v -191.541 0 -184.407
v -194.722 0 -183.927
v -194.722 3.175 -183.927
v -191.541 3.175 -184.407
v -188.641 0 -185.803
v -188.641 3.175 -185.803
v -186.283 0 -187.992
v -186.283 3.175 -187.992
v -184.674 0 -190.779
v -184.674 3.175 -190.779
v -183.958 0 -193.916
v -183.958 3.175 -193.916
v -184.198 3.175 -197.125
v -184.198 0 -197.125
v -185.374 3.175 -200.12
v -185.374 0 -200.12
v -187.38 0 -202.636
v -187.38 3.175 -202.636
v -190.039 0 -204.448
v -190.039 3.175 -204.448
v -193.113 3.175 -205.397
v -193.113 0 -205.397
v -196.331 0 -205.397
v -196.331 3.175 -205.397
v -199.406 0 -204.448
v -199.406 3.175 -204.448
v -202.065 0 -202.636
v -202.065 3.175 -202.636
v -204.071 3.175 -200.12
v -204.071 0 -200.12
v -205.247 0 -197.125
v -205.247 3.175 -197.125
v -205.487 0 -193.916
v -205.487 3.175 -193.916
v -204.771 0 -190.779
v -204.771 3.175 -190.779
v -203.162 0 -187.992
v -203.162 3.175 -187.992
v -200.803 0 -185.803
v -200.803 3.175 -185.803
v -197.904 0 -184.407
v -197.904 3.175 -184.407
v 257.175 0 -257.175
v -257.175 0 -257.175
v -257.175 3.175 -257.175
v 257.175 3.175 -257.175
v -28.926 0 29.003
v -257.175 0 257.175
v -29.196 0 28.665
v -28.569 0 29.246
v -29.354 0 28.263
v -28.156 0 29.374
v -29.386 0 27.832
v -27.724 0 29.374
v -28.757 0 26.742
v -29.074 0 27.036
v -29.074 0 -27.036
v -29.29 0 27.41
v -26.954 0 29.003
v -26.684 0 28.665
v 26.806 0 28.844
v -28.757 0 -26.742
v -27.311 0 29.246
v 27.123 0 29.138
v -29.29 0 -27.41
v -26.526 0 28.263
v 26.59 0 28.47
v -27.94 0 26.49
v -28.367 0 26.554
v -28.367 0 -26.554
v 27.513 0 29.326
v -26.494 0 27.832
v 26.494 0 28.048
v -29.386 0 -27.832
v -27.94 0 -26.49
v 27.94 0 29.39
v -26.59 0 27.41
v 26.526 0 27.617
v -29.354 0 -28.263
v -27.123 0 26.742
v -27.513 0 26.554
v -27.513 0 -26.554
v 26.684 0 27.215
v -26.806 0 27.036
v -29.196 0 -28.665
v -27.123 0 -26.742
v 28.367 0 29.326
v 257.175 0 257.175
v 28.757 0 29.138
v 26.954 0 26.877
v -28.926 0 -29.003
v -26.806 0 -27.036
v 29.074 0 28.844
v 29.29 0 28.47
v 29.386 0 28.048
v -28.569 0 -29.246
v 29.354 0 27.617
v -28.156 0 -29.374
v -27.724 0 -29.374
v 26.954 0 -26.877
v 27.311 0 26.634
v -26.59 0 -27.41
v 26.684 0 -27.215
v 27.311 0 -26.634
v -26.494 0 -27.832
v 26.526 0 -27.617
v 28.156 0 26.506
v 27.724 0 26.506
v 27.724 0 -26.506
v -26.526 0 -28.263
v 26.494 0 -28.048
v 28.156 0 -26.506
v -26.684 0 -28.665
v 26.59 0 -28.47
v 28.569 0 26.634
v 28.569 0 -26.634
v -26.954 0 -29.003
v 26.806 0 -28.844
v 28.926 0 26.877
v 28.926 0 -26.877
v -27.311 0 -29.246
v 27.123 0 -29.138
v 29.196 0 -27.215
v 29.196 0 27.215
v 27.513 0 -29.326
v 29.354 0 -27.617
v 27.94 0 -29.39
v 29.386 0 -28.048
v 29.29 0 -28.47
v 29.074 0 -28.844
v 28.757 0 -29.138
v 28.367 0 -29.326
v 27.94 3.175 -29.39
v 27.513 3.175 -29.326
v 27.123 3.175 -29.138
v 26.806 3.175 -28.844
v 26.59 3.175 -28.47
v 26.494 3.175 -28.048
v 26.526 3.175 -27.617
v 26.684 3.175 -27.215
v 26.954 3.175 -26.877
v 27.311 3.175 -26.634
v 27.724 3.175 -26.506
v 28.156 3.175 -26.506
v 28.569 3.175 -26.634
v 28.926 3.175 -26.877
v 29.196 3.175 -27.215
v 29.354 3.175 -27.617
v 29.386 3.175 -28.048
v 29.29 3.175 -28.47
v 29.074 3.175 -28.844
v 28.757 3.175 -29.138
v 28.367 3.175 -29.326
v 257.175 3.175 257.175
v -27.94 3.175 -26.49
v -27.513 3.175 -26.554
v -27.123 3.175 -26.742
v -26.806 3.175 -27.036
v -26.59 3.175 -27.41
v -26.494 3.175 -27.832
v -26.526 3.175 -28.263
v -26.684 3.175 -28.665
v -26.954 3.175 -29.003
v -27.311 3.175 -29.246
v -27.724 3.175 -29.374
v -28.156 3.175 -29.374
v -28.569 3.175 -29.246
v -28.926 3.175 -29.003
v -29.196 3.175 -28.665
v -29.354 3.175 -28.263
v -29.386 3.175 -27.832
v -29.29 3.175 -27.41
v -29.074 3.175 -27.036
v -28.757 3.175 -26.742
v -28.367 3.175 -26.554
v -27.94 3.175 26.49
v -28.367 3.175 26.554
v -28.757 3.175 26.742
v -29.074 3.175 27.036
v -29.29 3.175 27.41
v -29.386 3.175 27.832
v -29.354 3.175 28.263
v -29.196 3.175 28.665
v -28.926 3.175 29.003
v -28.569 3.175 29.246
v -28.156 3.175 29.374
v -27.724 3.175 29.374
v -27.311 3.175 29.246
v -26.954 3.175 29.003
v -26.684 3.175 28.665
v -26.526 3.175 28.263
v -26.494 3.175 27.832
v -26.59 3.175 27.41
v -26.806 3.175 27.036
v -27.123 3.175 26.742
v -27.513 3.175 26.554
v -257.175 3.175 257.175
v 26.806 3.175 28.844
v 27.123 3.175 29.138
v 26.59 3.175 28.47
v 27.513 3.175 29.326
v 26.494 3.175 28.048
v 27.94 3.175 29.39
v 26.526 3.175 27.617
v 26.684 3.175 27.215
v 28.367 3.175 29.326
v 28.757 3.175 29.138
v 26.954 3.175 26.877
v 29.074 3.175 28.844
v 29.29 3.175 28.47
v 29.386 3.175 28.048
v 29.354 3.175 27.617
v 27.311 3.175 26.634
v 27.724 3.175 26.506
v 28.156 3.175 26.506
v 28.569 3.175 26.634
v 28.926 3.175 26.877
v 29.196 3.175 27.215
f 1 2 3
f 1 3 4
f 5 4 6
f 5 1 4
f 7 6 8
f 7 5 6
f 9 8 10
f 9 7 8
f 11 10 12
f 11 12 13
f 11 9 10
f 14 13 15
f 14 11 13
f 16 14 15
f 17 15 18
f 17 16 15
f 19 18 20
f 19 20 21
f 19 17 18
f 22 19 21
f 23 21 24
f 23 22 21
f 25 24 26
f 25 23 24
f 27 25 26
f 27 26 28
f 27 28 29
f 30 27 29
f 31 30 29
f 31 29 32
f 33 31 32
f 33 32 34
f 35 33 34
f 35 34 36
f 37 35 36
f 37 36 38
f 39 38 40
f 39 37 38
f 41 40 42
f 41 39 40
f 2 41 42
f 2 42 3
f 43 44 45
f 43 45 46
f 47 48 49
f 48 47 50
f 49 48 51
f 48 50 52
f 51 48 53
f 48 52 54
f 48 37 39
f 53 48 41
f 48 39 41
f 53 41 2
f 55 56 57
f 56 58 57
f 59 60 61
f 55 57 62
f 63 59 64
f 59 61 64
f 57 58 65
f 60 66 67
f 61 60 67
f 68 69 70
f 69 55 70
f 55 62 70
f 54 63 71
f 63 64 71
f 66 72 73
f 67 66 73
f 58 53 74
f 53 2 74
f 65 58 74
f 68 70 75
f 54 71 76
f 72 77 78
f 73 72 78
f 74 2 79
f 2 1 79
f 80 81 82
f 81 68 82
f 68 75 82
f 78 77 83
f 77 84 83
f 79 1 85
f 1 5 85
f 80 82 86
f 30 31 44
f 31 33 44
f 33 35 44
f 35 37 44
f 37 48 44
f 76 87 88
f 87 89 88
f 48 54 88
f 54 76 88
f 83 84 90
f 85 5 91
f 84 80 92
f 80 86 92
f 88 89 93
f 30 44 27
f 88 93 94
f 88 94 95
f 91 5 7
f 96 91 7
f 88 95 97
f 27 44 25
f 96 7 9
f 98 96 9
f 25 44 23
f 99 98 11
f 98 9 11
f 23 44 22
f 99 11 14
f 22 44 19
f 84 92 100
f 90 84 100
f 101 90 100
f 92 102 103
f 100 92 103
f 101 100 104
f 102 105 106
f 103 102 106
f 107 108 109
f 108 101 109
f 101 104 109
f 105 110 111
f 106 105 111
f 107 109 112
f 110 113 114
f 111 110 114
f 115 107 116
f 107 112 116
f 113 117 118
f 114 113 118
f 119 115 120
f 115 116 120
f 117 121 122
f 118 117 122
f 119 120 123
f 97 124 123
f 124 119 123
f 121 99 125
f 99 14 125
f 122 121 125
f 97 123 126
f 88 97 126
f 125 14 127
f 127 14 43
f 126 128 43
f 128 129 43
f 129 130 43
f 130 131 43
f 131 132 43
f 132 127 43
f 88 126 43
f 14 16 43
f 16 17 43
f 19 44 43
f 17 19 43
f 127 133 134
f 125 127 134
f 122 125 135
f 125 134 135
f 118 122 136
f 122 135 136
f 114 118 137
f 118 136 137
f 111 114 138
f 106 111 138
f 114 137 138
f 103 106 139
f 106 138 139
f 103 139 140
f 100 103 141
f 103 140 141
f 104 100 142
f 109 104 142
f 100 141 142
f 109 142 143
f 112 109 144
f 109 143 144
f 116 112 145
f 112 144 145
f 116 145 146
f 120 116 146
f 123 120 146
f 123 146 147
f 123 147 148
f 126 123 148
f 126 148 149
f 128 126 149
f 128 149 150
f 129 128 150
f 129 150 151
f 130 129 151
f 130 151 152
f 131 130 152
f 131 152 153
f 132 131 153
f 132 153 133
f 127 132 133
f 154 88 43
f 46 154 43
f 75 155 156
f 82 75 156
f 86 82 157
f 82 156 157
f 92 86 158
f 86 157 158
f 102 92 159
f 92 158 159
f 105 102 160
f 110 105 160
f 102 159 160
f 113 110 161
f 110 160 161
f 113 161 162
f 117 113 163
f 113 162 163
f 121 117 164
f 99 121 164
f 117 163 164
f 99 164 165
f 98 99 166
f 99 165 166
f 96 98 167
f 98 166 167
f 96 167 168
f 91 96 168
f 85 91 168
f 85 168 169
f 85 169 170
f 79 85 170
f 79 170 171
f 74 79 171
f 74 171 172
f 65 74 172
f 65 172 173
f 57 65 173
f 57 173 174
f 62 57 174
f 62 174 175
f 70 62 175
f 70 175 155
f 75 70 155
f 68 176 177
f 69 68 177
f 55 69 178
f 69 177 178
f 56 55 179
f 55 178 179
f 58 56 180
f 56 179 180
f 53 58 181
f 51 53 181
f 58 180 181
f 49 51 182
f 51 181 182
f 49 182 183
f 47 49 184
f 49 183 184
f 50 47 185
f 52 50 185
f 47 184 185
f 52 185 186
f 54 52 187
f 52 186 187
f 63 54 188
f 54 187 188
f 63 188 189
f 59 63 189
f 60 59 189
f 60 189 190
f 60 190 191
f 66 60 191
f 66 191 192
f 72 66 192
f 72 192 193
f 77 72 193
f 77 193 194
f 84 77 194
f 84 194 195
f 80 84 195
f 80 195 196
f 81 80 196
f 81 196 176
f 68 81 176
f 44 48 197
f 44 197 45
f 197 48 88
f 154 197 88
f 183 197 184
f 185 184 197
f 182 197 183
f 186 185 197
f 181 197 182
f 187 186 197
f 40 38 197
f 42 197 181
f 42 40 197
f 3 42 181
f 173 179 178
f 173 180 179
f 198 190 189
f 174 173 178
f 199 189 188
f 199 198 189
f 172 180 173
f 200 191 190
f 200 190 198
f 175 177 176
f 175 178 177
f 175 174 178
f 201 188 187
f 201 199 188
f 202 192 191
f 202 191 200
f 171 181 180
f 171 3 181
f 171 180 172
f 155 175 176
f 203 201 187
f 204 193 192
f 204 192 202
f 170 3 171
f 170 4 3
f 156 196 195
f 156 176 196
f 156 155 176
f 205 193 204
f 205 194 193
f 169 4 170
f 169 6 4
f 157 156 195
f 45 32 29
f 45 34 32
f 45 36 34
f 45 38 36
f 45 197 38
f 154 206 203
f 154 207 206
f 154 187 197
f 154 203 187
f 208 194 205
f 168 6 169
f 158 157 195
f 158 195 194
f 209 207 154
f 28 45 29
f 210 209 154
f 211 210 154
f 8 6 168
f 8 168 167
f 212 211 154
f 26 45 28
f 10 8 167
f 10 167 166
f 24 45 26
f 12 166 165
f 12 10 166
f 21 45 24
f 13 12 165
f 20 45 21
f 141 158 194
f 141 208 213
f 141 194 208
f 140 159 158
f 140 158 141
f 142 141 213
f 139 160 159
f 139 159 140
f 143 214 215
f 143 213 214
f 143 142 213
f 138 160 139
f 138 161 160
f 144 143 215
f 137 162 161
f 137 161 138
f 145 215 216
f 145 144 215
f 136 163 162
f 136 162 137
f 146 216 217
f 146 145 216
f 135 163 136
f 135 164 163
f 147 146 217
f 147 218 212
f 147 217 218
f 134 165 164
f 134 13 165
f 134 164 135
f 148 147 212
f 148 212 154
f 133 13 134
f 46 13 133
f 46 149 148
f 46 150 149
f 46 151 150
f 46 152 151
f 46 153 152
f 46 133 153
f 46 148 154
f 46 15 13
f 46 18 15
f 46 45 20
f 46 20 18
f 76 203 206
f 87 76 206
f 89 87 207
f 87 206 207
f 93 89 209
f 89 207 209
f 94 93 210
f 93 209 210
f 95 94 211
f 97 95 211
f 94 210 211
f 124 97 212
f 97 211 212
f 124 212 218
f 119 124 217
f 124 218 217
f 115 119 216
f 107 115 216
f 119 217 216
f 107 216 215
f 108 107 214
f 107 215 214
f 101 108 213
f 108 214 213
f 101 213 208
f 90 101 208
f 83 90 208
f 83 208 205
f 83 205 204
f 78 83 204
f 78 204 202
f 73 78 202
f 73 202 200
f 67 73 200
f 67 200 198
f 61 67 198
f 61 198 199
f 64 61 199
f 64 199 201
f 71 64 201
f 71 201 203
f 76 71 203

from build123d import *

# Parameters (mm, degrees)
SKETCH1_W           = 514.35
SKETCH1_H           = 514.35
SKETCH1_R           = 10.795
BOSS_EXTRUDE1_DEPTH = 3.175
SKETCH2_R           = 1.45
CUT_EXTRUDE1_DEPTH  = 364.714231059


with BuildPart() as part:
    # Sketch1 → Boss-Extrude1 (new body)
    with BuildSketch(Plane(origin=(0, 0, 0), x_dir=(1, 0, 0), z_dir=(0, 1, 0))):
        Rectangle(SKETCH1_W, SKETCH1_H)
        with Locations(Location((-194.722397765, 194.722397765, 0), (0, 0, 270))):
            Circle(SKETCH1_R, mode=Mode.SUBTRACT)
    extrude(amount=BOSS_EXTRUDE1_DEPTH)

    # Sketch2 → Cut-Extrude1 (cut, through all)
    with BuildSketch(Plane(origin=(0, 3.175, 0), x_dir=(1, 0, 0), z_dir=(0, 1, 0))):
        with Locations(Location((-27.94, 27.94, 0), (0, 0, 270))):
            Circle(SKETCH2_R)
        with Locations(Location((27.94, 27.94, 0), (0, 0, 90))):
            Circle(SKETCH2_R)
        with Locations(Location((27.94, -27.94, 0), (0, 0, 270))):
            Circle(SKETCH2_R)
        with Locations(Location((-27.94, -27.94, 0), (0, 0, 90))):
            Circle(SKETCH2_R)
    extrude(amount=-CUT_EXTRUDE1_DEPTH, mode=Mode.SUBTRACT)


solid = part.part
